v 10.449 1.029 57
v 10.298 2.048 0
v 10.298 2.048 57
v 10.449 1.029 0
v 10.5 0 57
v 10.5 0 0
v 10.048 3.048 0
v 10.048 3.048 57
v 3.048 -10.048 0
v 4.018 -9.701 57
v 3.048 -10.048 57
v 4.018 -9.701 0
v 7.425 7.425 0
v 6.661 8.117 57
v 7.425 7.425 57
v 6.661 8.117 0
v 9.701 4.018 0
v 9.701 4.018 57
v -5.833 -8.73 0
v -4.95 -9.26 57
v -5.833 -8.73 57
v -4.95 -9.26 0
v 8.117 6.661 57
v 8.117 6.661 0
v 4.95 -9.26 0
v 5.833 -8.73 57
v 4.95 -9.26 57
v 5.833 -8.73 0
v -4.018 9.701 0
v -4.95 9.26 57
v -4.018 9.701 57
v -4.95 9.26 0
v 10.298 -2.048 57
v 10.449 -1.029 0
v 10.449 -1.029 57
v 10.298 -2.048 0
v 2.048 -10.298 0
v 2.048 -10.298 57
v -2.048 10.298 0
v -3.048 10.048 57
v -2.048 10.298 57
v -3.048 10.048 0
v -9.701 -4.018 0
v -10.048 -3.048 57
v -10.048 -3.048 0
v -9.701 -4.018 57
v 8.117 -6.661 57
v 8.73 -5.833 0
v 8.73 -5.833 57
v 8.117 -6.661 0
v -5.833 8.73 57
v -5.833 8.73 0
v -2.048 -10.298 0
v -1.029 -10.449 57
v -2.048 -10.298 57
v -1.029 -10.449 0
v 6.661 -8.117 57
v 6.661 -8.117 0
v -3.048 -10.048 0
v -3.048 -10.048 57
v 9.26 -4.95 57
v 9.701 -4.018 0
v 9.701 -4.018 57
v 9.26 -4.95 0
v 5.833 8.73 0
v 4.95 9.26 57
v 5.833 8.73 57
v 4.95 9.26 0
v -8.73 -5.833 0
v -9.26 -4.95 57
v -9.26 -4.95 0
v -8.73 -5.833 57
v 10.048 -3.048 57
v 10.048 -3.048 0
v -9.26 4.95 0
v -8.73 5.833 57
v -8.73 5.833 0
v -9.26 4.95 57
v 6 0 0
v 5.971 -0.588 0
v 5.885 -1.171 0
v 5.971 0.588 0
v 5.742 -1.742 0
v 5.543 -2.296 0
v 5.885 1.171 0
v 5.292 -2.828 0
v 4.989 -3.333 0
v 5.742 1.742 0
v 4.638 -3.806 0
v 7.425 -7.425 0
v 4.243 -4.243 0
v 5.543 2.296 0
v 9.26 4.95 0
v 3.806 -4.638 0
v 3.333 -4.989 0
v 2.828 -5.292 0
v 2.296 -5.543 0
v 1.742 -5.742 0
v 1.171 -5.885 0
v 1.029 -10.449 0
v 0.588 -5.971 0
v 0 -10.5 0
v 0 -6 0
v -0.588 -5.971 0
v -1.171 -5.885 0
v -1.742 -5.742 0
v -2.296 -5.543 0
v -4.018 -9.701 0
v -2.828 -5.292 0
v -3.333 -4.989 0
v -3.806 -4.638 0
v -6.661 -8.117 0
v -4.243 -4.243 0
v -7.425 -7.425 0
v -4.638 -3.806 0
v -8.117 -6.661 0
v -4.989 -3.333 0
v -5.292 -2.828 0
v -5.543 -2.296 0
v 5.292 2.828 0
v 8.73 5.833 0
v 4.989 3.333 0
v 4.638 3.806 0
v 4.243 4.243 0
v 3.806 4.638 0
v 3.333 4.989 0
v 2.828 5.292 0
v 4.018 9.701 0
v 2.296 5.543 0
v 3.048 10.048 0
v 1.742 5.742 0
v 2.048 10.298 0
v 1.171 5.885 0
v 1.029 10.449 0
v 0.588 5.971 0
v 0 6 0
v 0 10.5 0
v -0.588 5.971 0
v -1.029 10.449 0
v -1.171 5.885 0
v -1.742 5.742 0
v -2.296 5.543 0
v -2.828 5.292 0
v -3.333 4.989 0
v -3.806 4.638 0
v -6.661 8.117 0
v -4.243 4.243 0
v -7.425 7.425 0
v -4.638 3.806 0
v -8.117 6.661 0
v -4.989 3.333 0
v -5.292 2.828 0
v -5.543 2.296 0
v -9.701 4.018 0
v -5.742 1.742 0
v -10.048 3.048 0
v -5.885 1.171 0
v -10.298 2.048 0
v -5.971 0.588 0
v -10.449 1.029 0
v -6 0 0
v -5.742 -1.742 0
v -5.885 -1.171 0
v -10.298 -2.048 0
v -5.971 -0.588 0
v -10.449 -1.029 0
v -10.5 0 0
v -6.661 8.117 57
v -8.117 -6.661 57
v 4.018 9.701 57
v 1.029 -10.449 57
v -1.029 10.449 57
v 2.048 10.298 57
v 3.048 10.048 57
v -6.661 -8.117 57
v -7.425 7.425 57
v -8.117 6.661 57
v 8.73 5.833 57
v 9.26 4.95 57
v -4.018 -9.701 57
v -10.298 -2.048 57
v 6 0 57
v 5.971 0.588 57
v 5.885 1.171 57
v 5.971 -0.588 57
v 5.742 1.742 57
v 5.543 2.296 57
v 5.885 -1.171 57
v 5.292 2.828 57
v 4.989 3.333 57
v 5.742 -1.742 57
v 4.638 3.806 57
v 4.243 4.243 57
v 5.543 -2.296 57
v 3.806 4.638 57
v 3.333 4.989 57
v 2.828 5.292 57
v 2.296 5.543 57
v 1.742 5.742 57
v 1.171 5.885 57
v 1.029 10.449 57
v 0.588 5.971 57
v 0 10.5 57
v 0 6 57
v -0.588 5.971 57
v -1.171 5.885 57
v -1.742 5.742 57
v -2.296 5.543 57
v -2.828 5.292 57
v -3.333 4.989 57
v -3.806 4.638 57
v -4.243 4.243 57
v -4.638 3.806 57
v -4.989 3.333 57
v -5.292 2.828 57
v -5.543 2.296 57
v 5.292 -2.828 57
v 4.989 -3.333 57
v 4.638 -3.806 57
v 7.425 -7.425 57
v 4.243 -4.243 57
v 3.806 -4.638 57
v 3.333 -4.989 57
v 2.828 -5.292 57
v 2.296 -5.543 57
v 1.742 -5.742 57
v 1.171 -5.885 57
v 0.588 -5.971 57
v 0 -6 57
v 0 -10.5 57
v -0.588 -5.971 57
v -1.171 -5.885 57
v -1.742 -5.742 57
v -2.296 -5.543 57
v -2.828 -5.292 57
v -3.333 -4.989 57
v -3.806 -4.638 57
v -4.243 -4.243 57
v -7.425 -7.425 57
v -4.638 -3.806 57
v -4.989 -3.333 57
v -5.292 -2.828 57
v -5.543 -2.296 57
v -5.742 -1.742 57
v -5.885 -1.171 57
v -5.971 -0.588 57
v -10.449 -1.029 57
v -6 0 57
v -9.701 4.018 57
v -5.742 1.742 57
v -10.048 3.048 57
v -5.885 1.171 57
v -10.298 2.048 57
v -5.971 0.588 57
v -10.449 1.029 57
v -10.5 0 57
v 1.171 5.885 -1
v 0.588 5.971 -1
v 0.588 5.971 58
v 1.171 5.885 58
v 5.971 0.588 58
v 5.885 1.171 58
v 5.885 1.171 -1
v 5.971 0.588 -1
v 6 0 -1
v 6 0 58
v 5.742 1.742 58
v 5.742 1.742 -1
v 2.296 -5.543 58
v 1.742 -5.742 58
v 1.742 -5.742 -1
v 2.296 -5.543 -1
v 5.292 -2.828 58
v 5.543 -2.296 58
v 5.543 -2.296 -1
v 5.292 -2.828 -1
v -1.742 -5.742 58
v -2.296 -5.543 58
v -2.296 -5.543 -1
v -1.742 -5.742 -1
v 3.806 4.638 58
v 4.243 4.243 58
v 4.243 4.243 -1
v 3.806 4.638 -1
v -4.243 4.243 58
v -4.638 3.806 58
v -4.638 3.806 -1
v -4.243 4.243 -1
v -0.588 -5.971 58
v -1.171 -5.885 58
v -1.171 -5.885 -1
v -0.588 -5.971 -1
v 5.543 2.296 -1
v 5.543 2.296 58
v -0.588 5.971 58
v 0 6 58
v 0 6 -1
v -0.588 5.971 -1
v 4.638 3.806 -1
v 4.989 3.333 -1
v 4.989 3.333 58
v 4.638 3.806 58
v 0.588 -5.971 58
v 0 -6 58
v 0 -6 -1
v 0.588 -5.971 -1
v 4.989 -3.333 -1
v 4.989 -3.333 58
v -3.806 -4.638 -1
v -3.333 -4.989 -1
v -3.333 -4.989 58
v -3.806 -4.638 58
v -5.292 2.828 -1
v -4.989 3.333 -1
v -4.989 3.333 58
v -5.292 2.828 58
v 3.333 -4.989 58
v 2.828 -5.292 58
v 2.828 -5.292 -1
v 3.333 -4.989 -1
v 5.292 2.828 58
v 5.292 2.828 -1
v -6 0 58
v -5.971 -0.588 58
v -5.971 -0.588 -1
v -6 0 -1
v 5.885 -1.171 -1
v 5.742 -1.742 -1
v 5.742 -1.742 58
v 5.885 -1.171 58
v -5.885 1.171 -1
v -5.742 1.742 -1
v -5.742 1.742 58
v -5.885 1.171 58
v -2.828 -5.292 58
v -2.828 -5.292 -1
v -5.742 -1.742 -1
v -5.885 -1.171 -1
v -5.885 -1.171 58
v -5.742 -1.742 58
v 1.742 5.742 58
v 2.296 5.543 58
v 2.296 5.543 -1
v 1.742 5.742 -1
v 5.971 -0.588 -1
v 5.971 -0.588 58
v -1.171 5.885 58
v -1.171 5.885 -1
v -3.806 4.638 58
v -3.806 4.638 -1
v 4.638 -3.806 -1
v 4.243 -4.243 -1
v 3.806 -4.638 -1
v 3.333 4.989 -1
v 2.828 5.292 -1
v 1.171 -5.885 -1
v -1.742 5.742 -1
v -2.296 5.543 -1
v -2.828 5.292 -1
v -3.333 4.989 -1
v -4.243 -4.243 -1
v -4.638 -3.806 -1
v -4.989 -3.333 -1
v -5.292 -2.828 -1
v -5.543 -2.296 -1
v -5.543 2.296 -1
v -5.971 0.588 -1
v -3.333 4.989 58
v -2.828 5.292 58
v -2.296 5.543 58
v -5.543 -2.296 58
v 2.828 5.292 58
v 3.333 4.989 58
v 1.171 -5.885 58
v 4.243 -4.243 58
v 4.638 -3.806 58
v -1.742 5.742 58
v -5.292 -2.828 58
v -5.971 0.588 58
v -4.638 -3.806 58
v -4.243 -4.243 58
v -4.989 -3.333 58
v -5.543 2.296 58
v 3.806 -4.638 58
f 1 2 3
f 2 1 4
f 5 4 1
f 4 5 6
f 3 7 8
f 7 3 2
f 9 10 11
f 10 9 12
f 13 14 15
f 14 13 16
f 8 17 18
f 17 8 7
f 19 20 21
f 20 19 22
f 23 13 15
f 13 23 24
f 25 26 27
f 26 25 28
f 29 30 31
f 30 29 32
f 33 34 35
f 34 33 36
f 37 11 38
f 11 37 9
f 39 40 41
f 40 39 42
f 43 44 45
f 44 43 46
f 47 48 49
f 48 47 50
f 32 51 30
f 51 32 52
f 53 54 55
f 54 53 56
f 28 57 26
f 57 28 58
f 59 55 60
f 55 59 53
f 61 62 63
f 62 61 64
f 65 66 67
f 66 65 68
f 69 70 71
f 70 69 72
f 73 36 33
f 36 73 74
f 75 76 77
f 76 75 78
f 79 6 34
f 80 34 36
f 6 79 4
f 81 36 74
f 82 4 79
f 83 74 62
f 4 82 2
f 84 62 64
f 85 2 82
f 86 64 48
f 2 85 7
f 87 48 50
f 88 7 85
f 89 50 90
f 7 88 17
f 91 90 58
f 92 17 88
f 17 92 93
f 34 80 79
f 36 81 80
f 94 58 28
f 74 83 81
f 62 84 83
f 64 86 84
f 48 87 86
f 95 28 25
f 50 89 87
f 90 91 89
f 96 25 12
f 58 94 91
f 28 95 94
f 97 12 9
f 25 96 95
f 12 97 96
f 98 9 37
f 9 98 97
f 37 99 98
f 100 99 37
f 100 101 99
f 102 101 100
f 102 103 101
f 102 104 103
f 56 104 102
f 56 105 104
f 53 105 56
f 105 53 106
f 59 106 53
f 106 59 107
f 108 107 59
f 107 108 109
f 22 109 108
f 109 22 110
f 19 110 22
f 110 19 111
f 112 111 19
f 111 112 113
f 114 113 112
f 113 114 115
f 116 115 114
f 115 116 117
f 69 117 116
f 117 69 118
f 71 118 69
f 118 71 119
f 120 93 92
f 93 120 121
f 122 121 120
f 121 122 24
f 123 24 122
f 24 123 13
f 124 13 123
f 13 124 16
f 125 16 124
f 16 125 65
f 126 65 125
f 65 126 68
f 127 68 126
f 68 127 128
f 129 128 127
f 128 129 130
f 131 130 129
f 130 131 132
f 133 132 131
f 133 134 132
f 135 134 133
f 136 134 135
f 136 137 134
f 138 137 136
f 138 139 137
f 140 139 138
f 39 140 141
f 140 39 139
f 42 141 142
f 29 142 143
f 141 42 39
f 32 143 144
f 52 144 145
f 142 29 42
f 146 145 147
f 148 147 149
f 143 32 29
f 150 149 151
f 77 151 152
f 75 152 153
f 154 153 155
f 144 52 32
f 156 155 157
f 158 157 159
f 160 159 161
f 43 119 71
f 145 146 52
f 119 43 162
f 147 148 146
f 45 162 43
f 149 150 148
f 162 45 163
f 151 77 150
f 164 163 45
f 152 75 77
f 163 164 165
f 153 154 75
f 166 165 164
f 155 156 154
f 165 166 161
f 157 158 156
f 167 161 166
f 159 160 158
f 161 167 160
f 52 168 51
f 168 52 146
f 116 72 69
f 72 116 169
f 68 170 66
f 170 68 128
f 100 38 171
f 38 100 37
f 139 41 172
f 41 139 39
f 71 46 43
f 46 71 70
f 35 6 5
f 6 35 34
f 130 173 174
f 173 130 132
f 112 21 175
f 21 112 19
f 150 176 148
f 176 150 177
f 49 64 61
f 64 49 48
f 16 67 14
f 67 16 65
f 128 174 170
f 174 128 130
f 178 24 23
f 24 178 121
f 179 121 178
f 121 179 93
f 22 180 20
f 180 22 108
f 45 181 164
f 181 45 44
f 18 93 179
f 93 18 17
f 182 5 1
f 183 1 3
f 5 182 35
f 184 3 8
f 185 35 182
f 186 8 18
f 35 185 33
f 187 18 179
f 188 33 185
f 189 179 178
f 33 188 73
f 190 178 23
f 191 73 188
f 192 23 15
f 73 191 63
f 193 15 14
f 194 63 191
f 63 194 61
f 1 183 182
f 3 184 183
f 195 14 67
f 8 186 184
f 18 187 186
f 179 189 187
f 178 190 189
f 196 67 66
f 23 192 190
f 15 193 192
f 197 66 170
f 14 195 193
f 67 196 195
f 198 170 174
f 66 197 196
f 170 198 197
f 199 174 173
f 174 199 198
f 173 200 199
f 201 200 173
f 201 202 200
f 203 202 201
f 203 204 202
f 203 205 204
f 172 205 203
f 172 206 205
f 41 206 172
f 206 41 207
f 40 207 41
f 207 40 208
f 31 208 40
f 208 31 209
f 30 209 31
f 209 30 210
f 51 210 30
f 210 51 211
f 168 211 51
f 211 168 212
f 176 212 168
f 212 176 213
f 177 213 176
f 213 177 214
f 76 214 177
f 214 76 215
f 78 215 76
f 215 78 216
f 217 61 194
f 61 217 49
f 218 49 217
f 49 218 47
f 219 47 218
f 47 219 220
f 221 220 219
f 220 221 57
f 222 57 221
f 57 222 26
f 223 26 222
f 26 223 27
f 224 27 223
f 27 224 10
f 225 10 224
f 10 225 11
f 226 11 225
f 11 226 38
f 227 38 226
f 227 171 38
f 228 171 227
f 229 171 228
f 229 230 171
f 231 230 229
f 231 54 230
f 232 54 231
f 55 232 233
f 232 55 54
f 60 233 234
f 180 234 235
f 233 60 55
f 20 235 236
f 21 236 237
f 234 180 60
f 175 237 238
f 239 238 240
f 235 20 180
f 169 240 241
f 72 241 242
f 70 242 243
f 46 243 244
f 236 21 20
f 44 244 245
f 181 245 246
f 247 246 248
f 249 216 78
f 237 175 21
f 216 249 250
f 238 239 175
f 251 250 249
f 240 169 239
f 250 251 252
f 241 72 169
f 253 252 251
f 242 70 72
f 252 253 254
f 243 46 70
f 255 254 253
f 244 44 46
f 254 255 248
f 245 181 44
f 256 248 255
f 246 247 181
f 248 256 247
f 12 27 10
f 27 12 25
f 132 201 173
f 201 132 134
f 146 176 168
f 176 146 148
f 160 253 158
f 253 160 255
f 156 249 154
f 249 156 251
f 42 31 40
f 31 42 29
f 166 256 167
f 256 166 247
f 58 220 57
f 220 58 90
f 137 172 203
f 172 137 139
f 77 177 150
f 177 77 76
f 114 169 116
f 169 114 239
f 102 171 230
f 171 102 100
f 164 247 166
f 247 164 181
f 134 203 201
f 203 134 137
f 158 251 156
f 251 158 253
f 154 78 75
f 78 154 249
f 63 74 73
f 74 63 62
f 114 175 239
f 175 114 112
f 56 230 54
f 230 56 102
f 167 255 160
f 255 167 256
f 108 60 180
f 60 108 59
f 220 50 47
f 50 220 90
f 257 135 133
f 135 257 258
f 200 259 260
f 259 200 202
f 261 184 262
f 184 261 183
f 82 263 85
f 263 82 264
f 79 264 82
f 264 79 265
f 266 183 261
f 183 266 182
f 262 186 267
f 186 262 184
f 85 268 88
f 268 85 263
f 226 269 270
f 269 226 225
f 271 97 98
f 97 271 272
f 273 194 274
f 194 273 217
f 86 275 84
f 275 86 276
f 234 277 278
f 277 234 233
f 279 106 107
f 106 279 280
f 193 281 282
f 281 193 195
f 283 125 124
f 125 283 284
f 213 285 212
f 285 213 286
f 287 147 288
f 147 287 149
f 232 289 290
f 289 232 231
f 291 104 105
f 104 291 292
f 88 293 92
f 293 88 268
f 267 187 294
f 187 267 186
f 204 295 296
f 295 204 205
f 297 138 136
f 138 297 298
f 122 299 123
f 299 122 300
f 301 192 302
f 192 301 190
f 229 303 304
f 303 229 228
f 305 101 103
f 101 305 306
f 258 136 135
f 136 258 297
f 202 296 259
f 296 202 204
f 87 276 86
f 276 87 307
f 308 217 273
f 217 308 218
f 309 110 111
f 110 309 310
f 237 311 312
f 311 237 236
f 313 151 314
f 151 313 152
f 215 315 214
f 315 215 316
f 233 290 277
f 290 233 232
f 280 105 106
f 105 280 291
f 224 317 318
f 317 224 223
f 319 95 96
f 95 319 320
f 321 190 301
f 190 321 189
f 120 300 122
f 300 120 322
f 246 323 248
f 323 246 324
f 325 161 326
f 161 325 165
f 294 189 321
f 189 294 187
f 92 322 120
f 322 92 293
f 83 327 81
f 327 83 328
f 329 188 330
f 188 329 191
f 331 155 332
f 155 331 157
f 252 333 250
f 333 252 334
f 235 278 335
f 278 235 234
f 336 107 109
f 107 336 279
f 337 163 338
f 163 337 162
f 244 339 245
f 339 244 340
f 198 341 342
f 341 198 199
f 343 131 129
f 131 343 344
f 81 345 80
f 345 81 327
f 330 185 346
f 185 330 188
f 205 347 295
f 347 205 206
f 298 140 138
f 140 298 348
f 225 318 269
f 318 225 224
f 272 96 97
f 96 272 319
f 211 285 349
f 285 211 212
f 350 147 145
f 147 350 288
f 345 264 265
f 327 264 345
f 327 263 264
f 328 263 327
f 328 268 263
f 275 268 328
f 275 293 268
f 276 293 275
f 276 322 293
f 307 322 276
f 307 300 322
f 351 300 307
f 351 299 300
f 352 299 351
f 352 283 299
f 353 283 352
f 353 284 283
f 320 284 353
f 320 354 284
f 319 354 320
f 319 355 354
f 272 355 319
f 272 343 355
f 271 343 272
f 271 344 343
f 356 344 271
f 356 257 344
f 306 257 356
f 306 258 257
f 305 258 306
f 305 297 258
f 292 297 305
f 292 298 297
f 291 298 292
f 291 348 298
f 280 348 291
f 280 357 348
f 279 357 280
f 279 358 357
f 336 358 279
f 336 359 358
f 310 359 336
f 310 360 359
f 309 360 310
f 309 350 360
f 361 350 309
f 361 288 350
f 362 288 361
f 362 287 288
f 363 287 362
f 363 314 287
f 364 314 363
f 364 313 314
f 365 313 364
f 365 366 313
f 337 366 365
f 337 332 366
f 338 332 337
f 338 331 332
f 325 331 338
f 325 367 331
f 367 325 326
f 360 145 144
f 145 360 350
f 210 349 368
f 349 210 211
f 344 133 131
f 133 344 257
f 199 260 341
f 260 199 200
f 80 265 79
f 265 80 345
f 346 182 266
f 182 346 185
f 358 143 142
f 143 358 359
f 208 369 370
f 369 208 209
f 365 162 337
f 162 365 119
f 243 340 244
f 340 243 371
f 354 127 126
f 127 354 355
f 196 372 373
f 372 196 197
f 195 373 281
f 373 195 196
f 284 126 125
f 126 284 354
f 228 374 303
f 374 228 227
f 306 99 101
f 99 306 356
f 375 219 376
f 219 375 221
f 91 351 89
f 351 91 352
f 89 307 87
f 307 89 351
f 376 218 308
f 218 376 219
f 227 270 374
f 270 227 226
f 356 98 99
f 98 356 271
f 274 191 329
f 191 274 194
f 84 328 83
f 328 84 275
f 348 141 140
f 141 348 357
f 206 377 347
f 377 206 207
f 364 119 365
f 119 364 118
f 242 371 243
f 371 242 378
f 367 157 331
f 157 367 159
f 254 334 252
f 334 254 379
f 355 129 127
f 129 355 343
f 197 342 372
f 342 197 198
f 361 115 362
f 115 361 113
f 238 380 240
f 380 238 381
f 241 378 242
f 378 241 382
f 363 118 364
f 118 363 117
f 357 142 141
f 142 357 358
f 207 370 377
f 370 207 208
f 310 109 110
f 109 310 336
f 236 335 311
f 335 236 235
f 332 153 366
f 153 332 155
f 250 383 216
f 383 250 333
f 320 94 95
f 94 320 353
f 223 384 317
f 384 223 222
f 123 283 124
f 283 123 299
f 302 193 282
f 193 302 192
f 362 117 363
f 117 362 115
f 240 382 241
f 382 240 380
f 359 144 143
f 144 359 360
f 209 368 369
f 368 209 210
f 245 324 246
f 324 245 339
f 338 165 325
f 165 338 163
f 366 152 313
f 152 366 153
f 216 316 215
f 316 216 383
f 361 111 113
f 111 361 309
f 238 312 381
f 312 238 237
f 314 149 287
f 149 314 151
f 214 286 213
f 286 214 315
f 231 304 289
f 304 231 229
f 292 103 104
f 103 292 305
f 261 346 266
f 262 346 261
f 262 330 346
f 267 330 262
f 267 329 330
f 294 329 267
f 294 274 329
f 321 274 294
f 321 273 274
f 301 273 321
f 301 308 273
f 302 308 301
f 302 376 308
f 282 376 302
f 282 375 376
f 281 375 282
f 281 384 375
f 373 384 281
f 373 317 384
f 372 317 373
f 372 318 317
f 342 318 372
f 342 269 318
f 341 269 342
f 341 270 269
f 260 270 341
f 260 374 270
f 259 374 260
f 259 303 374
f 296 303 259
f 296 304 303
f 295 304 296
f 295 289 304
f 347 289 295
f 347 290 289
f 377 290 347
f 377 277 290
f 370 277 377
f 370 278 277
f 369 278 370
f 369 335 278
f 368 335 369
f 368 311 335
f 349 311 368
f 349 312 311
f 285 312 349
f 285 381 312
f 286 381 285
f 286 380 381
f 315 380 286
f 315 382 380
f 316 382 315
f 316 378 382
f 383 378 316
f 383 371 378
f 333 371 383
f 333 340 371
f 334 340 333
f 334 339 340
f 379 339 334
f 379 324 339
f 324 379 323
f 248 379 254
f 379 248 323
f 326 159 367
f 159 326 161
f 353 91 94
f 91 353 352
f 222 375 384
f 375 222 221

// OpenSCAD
cylinder(h=57.0, d=21.0, $fn=64);
translate([0, 0, -1])
cylinder(h=59.0, d=12.0, $fn=64);
